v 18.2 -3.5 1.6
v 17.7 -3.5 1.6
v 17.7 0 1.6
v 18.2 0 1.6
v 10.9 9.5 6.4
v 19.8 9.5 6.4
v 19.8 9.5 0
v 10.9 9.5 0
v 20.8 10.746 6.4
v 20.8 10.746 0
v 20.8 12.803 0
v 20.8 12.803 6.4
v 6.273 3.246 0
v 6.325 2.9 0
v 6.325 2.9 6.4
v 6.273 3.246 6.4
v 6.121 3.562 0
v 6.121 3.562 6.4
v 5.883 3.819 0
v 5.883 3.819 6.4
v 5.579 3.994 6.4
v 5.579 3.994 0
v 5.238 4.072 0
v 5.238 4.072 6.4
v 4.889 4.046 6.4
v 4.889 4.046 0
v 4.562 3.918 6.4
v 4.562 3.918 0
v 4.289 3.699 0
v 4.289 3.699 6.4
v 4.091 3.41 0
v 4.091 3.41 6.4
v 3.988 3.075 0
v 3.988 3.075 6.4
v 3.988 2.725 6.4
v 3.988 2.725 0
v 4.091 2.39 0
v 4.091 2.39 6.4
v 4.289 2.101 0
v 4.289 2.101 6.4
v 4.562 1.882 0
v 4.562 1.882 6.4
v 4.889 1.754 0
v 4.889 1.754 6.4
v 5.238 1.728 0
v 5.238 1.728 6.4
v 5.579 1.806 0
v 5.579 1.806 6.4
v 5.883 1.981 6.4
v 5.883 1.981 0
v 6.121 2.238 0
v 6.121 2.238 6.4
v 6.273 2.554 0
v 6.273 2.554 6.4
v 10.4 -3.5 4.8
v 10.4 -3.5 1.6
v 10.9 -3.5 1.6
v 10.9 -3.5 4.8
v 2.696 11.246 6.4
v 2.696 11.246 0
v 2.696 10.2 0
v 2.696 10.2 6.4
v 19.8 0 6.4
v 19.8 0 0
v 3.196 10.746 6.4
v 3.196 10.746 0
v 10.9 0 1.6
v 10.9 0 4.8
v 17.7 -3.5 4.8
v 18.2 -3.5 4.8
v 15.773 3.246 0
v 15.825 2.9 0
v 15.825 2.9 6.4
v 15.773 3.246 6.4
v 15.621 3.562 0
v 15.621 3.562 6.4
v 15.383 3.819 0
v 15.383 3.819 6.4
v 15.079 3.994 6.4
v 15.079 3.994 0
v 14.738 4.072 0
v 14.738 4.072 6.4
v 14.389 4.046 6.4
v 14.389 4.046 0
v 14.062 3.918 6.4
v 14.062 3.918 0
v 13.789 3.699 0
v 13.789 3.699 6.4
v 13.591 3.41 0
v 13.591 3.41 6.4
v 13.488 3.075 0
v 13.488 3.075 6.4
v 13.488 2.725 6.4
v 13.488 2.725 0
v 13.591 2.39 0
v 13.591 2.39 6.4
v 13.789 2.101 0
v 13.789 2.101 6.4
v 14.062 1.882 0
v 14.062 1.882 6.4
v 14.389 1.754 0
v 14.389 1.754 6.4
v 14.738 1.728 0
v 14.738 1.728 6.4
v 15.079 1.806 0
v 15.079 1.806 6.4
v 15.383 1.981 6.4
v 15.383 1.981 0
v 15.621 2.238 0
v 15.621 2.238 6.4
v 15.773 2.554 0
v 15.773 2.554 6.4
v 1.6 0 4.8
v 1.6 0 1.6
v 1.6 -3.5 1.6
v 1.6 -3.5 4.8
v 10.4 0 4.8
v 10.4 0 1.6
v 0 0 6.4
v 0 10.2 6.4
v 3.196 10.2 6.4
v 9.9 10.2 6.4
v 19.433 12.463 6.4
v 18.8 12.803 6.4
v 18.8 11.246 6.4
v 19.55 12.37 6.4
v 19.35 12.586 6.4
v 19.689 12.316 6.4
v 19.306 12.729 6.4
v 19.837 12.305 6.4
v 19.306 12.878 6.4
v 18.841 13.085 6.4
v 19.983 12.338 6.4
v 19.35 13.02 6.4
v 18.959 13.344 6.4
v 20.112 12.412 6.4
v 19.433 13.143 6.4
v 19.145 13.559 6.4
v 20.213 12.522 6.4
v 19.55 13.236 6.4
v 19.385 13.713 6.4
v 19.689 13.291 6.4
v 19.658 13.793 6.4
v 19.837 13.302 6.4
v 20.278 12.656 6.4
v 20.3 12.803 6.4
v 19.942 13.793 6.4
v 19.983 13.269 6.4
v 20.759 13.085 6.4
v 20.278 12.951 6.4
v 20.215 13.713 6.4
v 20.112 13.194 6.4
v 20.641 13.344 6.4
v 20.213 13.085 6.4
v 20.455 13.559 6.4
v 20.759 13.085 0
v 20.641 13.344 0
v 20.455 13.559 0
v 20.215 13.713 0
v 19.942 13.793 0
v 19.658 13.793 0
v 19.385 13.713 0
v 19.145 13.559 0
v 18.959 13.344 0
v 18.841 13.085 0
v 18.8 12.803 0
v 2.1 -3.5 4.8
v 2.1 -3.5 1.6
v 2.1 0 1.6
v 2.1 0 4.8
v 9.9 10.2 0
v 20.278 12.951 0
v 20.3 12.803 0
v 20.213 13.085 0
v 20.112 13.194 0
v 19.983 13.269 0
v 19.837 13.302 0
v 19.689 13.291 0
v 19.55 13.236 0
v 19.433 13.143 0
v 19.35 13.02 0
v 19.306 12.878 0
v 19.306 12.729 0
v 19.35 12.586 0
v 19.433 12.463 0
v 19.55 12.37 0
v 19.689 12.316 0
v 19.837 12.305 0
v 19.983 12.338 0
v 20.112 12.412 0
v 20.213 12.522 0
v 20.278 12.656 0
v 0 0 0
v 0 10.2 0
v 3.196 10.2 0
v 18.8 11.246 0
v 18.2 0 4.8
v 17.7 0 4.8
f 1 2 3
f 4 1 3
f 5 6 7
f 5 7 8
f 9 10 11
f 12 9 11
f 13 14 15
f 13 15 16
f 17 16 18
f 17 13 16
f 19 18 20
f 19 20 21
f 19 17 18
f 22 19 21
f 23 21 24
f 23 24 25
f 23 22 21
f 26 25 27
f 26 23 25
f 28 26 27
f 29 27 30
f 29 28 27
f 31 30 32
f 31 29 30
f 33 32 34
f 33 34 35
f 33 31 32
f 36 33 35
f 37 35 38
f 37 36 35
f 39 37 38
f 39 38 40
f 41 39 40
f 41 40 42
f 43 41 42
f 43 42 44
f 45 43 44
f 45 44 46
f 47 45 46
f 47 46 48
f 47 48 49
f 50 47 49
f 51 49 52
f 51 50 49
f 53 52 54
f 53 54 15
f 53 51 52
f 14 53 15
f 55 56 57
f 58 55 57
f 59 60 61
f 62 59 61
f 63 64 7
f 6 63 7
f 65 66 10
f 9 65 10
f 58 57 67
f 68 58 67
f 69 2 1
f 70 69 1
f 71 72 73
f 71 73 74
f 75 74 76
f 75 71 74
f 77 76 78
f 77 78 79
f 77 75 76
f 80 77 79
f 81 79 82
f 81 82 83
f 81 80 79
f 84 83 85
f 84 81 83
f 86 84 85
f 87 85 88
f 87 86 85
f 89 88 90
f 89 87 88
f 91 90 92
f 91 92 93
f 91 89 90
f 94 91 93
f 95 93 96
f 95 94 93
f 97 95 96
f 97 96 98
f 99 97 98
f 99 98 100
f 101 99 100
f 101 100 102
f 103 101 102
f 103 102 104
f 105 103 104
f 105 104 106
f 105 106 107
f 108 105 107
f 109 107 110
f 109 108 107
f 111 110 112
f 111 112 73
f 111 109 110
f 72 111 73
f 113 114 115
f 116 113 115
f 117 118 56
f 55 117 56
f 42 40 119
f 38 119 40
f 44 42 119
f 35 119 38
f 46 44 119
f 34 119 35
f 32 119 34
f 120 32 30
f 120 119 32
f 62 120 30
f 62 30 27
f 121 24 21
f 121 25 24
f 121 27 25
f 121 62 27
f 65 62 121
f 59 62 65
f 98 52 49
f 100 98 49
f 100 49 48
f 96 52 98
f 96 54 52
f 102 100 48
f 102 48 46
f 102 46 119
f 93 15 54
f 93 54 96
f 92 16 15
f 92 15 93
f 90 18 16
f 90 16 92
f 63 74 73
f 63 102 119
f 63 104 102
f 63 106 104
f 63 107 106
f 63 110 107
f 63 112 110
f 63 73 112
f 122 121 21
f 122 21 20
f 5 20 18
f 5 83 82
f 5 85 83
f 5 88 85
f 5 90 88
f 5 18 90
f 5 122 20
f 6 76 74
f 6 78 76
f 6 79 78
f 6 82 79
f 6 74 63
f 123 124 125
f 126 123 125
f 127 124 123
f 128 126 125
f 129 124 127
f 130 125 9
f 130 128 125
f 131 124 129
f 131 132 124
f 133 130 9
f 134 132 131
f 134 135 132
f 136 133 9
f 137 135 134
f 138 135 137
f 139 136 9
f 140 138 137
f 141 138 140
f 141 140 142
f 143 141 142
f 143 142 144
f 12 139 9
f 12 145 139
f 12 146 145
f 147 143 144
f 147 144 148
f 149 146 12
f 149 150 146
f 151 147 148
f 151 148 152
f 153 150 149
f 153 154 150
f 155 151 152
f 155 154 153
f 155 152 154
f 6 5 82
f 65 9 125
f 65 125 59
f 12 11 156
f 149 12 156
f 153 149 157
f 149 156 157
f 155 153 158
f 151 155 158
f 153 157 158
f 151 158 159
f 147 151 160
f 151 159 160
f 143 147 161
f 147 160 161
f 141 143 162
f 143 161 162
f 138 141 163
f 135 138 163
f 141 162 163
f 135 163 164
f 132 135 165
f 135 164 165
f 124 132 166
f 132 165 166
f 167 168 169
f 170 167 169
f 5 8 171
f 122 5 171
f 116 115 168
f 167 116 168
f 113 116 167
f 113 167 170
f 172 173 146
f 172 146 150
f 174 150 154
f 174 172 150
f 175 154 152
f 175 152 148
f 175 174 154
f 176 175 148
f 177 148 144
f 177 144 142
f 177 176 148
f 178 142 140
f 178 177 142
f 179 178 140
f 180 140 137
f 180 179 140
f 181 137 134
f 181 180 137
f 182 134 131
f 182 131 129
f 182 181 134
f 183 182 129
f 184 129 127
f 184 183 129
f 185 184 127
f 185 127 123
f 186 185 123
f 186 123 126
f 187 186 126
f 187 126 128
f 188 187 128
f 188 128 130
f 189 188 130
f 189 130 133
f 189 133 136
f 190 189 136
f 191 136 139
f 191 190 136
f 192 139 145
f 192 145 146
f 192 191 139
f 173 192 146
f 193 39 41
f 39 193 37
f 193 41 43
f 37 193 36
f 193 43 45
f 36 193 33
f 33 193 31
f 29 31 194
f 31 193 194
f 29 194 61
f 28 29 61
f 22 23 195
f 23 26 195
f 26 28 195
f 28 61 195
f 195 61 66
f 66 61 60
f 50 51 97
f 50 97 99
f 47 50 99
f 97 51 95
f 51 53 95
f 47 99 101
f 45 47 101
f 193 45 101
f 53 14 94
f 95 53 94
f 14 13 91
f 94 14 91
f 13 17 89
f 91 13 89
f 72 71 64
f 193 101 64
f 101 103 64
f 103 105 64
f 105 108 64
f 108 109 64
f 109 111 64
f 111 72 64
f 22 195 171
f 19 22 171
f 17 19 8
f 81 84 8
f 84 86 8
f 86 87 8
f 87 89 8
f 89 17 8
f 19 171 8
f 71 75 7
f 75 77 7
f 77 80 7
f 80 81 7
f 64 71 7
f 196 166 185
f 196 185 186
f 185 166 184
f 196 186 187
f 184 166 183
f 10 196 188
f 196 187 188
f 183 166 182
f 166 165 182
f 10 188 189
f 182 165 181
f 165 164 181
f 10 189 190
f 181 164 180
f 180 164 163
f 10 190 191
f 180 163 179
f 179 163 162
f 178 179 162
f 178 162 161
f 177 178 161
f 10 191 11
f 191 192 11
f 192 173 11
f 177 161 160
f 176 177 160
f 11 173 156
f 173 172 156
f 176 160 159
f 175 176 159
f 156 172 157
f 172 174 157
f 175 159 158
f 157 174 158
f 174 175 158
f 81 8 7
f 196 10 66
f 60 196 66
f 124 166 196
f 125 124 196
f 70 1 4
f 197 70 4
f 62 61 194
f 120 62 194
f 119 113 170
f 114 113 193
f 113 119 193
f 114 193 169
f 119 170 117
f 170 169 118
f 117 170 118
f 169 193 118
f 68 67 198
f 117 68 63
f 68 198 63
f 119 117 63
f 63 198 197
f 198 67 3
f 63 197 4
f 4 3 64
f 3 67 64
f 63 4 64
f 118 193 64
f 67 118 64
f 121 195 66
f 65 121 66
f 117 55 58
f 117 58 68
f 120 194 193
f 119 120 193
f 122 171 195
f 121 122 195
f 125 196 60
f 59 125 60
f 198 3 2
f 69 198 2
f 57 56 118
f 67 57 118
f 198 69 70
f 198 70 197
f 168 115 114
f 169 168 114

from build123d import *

# Parameters (mm, degrees)
SKETCH1_R           = 1.175
SKETCH1_R_2         = 0.5
BOSS_EXTRUDE1_DEPTH = 6.4
SKETCH2_W           = 1.6
SKETCH2_H           = 3.5
CUT_EXTRUDE1_DEPTH  = 21.8
CUT_EXTRUDE2_DEPTH  = 7.4


with BuildPart() as part:
    # Sketch1 → Boss-Extrude1 (new body)
    with BuildSketch(Plane.XY):
        with BuildLine():
            Line((2.1, 0), (10.4, 0))
            Line((10.4, 0), (10.4, -3.5))
            Line((10.4, -3.5), (10.9, -3.5))
            Line((10.9, -3.5), (10.9, 0))
            Line((10.9, 0), (17.7, 0))
            Line((17.7, 0), (17.7, -3.5))
            Line((17.7, -3.5), (18.2, -3.5))
            Line((18.2, -3.5), (18.2, 0))
            Line((18.2, 0), (19.8, 0))
            Line((19.8, 0), (19.8, 10.2))
            Line((19.8, 10.2), (3.195717589, 10.2))
            Line((3.195717589, 10.2), (3.195717589, 10.746282688))
            Line((3.195717589, 10.746282688), (20.8, 10.746282688))
            Line((20.8, 10.746282688), (20.8, 12.80322859))
            ThreePointArc((20.8, 12.80322859), (19.8, 13.80322859), (18.8, 12.80322859))
            Line((18.8, 12.80322859), (18.8, 11.246282688))
            Line((18.8, 11.246282688), (2.695717589, 11.246282688))
            Line((2.695717589, 11.246282688), (2.695717589, 10.2))
            Line((2.695717589, 10.2), (0, 10.2))
            Line((0, 10.2), (0, 0))
            Line((0, 0), (1.6, 0))
            Line((1.6, 0), (1.6, -3.5))
            Line((1.6, -3.5), (2.1, -3.5))
            Line((2.1, -3.5), (2.1, 0))
        make_face()
        with Locations((5.15, 2.9)):
            Circle(SKETCH1_R, mode=Mode.SUBTRACT)
        with Locations((14.65, 2.9)):
            Circle(SKETCH1_R, mode=Mode.SUBTRACT)
        with Locations((19.8, 12.80322859)):
            Circle(SKETCH1_R_2, mode=Mode.SUBTRACT)
    extrude(amount=BOSS_EXTRUDE1_DEPTH)

    # Sketch2 → Cut-Extrude1 (cut, through all)
    with BuildSketch(Plane.ZY):
        with Locations((0.8, -1.75)):
            Rectangle(SKETCH2_W, SKETCH2_H)
        with Locations((5.6, -1.75)):
            Rectangle(SKETCH2_W, SKETCH2_H)
    extrude(amount=-CUT_EXTRUDE1_DEPTH, mode=Mode.SUBTRACT)

    # Sketch3 → Cut-Extrude2 (cut, through all)
    with BuildSketch(Plane.XY.offset(6.4)):
        Polygon((19.8, 9.5), (10.9, 9.5), (9.9, 10.2), (19.8, 10.2), align=None)
    extrude(amount=-CUT_EXTRUDE2_DEPTH, mode=Mode.SUBTRACT)


solid = part.part
